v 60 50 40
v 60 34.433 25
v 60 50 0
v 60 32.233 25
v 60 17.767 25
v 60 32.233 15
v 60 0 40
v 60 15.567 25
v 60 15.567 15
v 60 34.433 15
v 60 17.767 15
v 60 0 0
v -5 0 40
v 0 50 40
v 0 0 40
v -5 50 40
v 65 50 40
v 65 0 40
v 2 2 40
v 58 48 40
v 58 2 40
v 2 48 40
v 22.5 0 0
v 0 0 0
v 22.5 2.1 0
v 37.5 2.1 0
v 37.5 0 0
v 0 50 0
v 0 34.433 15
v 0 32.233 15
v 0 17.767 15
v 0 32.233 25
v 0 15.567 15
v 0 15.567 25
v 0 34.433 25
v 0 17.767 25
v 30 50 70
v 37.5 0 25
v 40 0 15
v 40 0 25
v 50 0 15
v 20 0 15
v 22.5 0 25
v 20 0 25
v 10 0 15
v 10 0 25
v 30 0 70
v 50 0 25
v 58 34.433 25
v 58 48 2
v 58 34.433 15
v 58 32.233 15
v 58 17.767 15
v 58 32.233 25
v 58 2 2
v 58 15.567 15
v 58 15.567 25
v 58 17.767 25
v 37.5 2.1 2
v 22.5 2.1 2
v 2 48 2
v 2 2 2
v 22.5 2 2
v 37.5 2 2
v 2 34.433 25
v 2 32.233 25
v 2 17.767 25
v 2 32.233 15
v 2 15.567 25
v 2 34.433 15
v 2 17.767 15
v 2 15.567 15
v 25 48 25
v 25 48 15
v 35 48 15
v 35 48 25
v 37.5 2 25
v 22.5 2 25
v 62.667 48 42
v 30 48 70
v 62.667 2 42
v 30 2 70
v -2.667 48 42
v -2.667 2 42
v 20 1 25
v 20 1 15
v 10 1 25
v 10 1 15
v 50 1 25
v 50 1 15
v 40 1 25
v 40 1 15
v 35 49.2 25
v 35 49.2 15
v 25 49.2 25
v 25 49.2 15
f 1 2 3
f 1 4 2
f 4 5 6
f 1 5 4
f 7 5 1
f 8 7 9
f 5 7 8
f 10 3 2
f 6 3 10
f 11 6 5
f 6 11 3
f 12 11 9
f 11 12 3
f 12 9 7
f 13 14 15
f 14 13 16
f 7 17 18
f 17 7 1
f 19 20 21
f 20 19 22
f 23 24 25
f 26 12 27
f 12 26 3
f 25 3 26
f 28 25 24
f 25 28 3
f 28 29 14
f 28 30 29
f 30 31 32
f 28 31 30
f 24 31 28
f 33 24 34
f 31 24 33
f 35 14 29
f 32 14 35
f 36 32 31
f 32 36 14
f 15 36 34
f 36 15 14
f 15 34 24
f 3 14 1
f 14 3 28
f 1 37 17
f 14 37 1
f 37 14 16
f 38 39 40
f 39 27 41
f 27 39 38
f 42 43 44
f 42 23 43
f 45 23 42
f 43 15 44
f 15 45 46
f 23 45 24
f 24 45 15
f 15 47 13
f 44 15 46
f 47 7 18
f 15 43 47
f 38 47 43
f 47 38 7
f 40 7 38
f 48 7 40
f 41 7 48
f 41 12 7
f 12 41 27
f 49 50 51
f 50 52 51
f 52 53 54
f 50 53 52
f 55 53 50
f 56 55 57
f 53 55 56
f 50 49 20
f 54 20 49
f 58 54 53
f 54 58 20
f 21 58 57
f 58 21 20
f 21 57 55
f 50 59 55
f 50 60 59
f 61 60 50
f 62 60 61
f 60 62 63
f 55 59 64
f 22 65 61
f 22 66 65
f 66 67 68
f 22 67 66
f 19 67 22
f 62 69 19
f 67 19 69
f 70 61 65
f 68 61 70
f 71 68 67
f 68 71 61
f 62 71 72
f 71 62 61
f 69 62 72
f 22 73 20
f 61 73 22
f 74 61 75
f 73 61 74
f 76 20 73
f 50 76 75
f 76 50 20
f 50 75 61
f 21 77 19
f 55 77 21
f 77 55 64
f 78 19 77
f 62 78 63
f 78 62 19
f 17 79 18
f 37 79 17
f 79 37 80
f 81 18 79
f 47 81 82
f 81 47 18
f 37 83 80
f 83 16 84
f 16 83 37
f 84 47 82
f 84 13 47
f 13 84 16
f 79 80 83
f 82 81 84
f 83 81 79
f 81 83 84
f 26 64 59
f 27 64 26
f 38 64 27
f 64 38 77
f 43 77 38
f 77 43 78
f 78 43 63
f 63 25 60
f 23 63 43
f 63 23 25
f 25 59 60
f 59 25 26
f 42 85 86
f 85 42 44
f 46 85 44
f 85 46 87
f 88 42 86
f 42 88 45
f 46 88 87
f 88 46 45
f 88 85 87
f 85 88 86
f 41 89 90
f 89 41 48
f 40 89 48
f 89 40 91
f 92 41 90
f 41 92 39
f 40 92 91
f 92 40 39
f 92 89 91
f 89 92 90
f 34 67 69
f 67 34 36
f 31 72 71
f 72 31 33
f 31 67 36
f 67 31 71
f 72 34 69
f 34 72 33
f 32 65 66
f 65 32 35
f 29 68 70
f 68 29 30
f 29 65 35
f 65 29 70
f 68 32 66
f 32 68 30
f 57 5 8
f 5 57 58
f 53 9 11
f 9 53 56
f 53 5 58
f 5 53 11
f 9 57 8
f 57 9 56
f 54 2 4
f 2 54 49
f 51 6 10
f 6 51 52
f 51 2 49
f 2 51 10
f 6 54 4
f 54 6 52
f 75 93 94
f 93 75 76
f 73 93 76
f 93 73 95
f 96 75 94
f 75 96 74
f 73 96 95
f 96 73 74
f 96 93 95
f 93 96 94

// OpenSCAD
// Domek do wydruku 3D
// Parametry można dostosować według potrzeb

// ===== PARAMETRY =====
wall_thickness = 2;      // Grubość ścian
house_width = 60;        // Szerokość domku
house_depth = 50;        // Głębokość domku
house_height = 40;       // Wysokość ścian
roof_height = 30;        // Wysokość dachu
door_width = 15;         // Szerokość drzwi
door_height = 25;        // Wysokość drzwi
window_width = 10;       // Szerokość okna
window_height = 10;      // Wysokość okna

// ===== FUNKCJE POMOCNICZE =====
module walls() {
    difference() {
        // Zewnętrzne ściany
        cube([house_width, house_depth, house_height]);
        
        // Wydrążenie wewnątrz
        translate([wall_thickness, wall_thickness, wall_thickness])
            cube([
                house_width - 2*wall_thickness,
                house_depth - 2*wall_thickness,
                house_height
            ]);
    }
}

module door() {
    translate([house_width/2 - door_width/2, -0.1, 0])
        cube([door_width, wall_thickness + 0.2, door_height]);
}

module window(x, y) {
    translate([x, y, house_height/2])
        cube([window_width, wall_thickness + 0.2, window_height], center=true);
}

module roof() {
    translate([house_width/2, house_depth/2, house_height]) {
        rotate([90, 0, 0])
            linear_extrude(height=house_depth, center=true)
                polygon([
                    [-house_width/2 - 5, 0],
                    [house_width/2 + 5, 0],
                    [0, roof_height]
                ]);
    }
}

// ===== BUDOWA DOMKU =====
difference() {
    union() {
        // Ściany
        walls();
        
        // Dach
        difference() {
            roof();
            // Wydrążenie dachu
            translate([house_width/2, house_depth/2, house_height + wall_thickness])
                rotate([90, 0, 0])
                    linear_extrude(height=house_depth - 2*wall_thickness, center=true)
                        polygon([
                            [-house_width/2 - 3, 0],
                            [house_width/2 + 3, 0],
                            [0, roof_height - wall_thickness]
                        ]);
        }
    }
    
    // Drzwi
    door();
    
    // Okna - przednie ściana (po bokach drzwi)
    window(house_width/4, -0.1);
    window(3*house_width/4, -0.1);
    
    // Okna - boczne ściany
    window(-0.1, house_depth/3);
    window(-0.1, 2*house_depth/3);
    window(house_width - wall_thickness + 0.1, house_depth/3);
    window(house_width - wall_thickness + 0.1, 2*house_depth/3);
    
    // Okno - tylna ściana
    window(house_width/2, house_depth - wall_thickness + 0.1);
}
